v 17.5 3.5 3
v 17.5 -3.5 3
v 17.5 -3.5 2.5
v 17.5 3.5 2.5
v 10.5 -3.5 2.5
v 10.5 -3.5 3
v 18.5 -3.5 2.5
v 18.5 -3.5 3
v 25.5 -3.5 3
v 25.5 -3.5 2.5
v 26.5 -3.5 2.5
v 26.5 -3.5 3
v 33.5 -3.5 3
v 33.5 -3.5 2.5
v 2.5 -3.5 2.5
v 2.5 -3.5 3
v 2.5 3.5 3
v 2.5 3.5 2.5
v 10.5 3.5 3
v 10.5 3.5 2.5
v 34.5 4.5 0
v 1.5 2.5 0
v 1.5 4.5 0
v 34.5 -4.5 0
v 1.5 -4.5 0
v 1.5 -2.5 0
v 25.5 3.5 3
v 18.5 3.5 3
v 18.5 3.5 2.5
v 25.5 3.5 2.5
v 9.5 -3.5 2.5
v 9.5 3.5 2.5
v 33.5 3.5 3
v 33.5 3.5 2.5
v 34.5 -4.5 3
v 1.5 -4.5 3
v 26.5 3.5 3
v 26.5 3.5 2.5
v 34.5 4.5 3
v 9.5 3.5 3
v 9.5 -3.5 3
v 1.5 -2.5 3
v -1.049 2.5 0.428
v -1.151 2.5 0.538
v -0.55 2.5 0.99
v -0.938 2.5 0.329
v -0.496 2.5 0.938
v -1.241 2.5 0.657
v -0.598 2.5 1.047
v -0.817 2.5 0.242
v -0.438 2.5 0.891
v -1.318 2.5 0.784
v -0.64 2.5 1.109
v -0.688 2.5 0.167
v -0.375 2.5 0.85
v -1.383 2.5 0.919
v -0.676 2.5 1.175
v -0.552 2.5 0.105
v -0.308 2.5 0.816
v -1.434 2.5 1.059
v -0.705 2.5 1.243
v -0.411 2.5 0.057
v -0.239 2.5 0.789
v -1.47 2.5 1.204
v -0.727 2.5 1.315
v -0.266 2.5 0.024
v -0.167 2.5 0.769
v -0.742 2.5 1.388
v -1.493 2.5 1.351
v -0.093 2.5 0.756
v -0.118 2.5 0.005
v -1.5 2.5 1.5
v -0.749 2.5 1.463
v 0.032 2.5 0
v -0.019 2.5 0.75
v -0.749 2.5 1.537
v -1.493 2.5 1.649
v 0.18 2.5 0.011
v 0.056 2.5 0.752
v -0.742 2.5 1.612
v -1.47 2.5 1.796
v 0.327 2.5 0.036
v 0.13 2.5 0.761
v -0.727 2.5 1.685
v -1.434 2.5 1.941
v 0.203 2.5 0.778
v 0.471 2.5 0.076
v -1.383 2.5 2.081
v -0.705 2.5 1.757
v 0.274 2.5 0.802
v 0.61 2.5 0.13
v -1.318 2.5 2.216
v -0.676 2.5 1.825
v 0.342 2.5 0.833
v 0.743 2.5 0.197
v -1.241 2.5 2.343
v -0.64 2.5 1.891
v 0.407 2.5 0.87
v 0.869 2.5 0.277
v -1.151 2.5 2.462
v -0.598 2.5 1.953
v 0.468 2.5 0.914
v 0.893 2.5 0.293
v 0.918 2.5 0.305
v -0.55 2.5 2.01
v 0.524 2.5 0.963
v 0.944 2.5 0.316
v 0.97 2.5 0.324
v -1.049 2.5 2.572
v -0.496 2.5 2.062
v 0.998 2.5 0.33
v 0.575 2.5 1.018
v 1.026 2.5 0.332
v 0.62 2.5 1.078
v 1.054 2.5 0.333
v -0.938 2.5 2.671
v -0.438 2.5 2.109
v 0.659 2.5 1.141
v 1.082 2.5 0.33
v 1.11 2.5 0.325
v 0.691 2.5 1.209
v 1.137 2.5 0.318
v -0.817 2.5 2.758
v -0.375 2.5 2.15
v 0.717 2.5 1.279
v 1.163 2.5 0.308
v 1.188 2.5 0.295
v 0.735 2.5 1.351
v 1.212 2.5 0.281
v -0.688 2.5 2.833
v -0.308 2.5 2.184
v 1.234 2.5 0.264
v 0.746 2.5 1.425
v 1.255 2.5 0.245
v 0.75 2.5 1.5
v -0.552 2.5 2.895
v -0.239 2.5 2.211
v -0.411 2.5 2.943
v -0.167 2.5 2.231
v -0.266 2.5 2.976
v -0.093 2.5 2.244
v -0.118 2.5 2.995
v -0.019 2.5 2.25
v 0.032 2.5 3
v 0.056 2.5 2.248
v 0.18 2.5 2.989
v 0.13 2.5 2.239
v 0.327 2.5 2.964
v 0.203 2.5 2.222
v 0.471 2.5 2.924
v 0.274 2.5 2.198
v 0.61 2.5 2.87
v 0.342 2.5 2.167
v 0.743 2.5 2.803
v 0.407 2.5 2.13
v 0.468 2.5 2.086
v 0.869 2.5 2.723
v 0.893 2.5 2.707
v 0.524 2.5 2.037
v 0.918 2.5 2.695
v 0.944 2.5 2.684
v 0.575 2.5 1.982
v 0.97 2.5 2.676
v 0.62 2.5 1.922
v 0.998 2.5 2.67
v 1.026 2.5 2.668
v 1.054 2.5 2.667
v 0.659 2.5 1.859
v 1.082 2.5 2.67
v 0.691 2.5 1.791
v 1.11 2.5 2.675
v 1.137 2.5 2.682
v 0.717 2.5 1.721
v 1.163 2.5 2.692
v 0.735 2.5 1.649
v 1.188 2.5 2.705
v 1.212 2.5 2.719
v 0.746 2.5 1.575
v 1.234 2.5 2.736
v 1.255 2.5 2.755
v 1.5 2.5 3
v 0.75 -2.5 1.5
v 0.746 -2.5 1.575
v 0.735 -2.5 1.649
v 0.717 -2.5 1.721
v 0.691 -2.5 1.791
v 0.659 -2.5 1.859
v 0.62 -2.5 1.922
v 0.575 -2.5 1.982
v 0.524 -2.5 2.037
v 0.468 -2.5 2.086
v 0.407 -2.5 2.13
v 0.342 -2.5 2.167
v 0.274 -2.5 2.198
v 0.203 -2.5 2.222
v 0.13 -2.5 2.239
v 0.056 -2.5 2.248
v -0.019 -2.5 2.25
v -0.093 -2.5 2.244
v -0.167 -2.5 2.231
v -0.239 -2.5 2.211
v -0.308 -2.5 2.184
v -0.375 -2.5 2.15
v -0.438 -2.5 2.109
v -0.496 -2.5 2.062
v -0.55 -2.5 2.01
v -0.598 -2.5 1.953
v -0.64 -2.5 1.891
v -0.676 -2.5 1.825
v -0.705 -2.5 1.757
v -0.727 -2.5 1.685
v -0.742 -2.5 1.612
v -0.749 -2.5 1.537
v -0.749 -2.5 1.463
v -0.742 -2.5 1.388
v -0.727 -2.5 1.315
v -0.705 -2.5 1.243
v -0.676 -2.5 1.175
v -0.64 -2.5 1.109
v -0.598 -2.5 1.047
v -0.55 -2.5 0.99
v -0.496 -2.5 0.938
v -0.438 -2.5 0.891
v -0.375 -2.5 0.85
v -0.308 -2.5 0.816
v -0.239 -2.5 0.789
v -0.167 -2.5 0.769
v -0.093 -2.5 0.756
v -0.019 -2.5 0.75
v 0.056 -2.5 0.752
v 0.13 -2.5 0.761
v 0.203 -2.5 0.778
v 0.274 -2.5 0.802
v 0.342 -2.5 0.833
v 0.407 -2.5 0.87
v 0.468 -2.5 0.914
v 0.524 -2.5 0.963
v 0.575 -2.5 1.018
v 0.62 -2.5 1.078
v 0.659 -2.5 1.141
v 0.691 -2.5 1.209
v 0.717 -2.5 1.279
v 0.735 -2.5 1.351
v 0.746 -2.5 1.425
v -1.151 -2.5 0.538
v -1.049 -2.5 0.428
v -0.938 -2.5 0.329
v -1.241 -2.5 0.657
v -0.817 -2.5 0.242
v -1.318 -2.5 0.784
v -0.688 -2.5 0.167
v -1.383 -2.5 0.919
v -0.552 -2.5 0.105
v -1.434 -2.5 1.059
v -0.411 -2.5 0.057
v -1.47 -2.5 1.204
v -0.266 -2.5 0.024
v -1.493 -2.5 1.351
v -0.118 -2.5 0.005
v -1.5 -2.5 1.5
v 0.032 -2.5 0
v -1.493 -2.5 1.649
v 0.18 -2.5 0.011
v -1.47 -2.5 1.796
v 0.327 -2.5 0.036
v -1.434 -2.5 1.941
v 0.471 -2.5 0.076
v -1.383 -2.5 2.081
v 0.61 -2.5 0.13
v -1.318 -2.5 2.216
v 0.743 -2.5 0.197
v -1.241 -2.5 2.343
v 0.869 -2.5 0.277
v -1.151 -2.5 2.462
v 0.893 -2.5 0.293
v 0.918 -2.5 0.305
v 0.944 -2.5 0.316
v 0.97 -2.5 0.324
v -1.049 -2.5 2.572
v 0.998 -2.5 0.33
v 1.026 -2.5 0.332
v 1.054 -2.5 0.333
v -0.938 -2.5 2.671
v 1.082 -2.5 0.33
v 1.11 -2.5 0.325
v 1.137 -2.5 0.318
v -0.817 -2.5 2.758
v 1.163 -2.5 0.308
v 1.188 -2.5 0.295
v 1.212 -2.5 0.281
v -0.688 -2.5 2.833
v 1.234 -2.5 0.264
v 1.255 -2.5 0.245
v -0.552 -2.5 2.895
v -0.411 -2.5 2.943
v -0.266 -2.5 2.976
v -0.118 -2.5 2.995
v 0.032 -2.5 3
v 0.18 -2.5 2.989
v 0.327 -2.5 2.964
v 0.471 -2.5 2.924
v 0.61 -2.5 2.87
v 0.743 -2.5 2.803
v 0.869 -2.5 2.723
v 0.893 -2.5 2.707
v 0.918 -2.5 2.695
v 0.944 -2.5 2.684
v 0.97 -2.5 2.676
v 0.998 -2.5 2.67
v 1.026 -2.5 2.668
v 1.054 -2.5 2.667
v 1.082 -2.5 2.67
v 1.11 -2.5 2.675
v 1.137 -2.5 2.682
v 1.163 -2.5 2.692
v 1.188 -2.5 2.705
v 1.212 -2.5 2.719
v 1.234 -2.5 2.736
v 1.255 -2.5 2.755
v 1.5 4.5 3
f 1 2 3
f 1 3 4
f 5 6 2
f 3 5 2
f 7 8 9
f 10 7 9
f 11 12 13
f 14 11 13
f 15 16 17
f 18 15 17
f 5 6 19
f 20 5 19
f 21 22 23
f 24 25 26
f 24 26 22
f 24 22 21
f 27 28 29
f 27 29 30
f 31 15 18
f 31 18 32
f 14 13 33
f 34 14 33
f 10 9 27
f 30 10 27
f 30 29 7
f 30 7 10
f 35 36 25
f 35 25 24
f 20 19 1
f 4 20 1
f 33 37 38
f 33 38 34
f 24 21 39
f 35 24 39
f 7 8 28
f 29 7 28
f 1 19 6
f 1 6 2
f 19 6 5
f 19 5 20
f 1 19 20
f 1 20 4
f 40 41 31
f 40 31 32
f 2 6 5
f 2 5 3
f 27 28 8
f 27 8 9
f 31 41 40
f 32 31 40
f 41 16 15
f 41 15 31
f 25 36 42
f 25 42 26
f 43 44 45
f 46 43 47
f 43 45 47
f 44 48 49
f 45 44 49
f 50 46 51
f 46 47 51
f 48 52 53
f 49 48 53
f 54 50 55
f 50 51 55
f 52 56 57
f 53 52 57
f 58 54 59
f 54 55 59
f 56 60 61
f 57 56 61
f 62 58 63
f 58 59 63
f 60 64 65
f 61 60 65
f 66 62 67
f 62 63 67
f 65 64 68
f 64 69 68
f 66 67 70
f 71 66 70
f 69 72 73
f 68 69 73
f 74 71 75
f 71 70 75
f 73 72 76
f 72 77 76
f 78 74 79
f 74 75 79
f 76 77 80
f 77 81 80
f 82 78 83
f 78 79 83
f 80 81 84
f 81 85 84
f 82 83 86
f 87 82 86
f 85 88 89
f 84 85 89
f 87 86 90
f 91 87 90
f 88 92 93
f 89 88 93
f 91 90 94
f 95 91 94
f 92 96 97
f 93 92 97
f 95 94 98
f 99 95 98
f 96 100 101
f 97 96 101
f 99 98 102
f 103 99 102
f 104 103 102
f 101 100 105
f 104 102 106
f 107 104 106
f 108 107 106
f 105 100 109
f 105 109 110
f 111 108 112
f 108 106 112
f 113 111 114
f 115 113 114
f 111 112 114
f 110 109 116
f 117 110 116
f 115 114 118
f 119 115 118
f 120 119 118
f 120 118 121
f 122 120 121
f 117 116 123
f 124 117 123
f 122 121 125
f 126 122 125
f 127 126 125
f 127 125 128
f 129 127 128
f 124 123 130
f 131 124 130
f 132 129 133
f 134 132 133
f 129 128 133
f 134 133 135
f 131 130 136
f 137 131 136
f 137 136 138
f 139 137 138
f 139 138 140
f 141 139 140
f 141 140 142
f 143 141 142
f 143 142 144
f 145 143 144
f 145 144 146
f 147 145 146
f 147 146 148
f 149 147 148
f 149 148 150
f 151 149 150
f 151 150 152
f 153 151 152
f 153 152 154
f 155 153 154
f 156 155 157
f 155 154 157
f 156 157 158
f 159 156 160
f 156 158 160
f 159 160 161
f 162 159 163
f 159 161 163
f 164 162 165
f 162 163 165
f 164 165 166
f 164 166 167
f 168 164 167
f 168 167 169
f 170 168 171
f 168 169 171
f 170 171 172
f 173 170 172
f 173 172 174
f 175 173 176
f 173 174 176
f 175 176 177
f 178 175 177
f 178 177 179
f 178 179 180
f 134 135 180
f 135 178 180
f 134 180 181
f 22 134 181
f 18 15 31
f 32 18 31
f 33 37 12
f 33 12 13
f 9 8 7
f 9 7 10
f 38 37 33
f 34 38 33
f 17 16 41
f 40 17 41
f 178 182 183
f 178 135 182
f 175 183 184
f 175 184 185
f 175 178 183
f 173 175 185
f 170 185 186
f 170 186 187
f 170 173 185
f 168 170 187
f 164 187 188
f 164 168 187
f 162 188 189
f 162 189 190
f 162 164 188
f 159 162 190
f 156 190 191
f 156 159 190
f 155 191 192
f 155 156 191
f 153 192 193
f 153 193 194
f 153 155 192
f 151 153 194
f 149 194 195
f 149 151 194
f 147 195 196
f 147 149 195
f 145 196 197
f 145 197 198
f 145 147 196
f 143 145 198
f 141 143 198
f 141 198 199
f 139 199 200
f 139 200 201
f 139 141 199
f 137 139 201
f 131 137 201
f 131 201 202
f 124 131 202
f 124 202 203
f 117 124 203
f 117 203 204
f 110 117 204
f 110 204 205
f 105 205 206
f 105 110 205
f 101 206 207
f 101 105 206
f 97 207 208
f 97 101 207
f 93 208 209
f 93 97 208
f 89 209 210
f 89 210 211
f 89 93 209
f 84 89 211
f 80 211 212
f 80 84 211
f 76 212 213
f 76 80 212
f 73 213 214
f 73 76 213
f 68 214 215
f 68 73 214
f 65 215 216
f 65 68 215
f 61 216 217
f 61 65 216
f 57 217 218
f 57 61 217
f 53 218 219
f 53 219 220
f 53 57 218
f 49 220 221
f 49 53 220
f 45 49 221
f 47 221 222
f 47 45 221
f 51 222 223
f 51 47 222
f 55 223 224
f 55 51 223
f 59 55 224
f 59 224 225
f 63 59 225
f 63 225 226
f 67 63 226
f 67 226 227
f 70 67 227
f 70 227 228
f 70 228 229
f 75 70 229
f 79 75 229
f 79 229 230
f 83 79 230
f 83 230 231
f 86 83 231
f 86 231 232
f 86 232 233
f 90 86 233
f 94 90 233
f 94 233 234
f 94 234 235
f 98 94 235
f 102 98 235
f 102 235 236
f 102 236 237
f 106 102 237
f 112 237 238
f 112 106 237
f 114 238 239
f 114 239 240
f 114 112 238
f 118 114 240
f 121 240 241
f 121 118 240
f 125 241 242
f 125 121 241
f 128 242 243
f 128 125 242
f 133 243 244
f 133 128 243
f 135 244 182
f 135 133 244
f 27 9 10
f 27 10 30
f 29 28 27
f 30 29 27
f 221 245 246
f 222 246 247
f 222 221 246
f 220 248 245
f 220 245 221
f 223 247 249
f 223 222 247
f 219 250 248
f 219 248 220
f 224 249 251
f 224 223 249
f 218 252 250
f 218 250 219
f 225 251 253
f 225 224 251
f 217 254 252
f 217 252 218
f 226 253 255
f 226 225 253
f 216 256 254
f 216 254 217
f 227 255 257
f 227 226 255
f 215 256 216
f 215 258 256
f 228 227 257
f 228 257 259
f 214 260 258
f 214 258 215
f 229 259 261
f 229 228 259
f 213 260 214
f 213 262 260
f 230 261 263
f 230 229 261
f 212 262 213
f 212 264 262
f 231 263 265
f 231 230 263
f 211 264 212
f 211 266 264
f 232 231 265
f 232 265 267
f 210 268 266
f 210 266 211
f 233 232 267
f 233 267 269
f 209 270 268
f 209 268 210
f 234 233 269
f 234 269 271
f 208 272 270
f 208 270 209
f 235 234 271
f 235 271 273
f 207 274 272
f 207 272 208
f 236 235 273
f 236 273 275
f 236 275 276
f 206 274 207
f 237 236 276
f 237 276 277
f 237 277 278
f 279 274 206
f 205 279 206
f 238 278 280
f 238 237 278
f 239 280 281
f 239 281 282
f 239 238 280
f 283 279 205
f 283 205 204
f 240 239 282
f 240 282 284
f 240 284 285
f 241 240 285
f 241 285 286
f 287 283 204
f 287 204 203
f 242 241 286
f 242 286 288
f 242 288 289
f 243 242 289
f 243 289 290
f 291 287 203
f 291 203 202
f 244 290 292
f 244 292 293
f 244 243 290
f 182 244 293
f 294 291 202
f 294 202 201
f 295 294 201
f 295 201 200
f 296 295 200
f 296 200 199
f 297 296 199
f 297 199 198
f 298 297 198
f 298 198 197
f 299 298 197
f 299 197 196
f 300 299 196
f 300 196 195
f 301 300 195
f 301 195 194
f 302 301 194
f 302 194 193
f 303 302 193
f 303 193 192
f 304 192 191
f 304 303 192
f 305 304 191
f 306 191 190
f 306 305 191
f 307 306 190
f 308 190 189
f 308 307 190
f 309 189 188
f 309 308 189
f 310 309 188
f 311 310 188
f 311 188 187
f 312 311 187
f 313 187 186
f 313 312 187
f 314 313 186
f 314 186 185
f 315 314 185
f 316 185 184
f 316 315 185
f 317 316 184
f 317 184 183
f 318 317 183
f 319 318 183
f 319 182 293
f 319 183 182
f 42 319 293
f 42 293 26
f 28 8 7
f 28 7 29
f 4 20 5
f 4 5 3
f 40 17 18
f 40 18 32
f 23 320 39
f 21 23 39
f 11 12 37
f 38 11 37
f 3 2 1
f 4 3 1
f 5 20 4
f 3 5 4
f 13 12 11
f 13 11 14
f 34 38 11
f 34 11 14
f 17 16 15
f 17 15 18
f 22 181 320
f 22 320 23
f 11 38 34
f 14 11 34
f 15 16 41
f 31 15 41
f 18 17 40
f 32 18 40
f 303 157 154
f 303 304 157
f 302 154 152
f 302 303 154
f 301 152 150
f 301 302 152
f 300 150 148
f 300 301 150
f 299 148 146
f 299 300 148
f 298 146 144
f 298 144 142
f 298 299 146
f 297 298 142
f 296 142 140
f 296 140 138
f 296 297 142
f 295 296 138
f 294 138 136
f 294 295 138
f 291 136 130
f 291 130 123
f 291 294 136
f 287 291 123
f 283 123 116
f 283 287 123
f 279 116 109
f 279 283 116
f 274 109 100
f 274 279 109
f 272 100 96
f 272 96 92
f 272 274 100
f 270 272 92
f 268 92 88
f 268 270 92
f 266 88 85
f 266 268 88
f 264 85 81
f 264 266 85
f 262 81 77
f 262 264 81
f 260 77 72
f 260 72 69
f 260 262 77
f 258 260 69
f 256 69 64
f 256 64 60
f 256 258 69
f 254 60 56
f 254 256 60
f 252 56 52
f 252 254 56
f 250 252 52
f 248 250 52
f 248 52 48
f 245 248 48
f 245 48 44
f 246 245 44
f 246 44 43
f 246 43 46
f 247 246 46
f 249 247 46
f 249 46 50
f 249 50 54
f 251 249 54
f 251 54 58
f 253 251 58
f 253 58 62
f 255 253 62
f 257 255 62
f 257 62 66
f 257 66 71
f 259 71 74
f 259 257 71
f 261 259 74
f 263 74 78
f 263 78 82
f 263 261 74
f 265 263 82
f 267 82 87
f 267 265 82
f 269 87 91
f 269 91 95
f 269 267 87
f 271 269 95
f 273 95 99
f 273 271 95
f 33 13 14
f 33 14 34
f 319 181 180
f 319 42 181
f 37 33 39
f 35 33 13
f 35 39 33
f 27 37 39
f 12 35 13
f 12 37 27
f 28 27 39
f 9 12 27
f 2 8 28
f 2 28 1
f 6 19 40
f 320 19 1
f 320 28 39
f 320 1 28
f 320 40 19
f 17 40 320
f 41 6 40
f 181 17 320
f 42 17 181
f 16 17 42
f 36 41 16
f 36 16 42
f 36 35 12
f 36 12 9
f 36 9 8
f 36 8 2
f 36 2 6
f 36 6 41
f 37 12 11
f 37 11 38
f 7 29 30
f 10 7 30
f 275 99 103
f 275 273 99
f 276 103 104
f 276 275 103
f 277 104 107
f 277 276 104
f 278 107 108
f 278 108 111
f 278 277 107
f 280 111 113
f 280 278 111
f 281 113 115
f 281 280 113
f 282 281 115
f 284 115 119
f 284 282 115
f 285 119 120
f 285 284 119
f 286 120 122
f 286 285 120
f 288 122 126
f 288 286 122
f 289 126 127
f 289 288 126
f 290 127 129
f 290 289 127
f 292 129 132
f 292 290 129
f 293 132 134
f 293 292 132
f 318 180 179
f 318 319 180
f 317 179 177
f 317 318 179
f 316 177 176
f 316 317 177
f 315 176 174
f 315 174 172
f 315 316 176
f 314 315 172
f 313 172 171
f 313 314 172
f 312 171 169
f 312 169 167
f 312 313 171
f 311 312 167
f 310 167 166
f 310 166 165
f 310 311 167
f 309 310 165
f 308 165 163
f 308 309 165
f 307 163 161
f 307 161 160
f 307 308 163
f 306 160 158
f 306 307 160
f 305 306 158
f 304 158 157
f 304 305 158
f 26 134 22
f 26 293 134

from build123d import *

# Parameters (mm, degrees)
F1_DEPTH = 4.5
F0_R     = 0.75
F2_DEPTH = 2.5
F3_W     = 7
F3_H     = 7
F4_DEPTH = 0.5
F5_DEPTH = 0.5
F6_R     = 0.3


with BuildPart() as f1:
    # F0 (on Front) → F1 (new body, symmetric)
    with BuildSketch(Plane.XZ):
        Polygon((34.5, 3), (1.5, 3), (1.5, 1.5), (1.5, 0), (34.5, 0), align=None)
    extrude(amount=F1_DEPTH, both=True)

    # F0 (on Front) → F2 (join, symmetric)
    with BuildSketch(Plane.XZ):
        with BuildLine():
            Line((1.5, 1.5), (1.5, 3))
            Line((1.5, 3), (1.0606601718, 2.5606601718))
            ThreePointArc((1.0606601718, 2.5606601718), (1.3858192988, 2.0740251485), (1.5, 1.5))
        make_face()
        with BuildLine():
            Line((1.5, 0), (1.5, 1.5))
            ThreePointArc((1.5, 1.5), (1.3858192988, 0.9259748515), (1.0606601718, 0.4393398282))
            Line((1.0606601718, 0.4393398282), (1.5, 0))
        make_face()
        with BuildLine():
            ThreePointArc((1.0606601718, 0.4393398282), (1.3858192988, 0.9259748515), (1.5, 1.5))
            ThreePointArc((1.5, 1.5), (1.3858192988, 2.0740251485), (1.0606601718, 2.5606601718))
            ThreePointArc((1.0606601718, 2.5606601718), (-1.5, 1.5), (1.0606601718, 0.4393398282))
        make_face()
        with Locations((0, 1.5)):
            Circle(F0_R, mode=Mode.SUBTRACT)
    extrude(amount=F2_DEPTH, both=True)

    # F3 (on face) → F4 (cut)
    with BuildSketch(Plane.XY.offset(3)):
        with Locations((30, 0)):
            Rectangle(F3_W, F3_H)
        with Locations((22, 0)):
            Rectangle(F3_W, F3_H)
        with Locations((14, 0)):
            Rectangle(F3_W, F3_H)
        with Locations((6, 0)):
            Rectangle(F3_W, F3_H)
    extrude(amount=-F4_DEPTH, mode=Mode.SUBTRACT)

    # F6
    f6_edges = [f1.edges().sort_by_distance(p)[0] for p in [
        (1.06066, 0, 2.56066),
        (1.06066, 0, 0.43934),
    ]]
    fillet(f6_edges, radius=F6_R)


with BuildPart() as f5:
    # F3 (on face) → F5 (new body)
    with BuildSketch(Plane.XY.offset(3)):
        with Locations((6, 0)):
            Rectangle(F3_W, F3_H)
    extrude(amount=-F5_DEPTH)


with BuildPart() as f5b:
    # F3 (on face) → F5, piece 2 (new body)
    with BuildSketch(Plane.XY.offset(3)):
        with Locations((14, 0)):
            Rectangle(F3_W, F3_H)
    extrude(amount=-F5_DEPTH)


with BuildPart() as f5c:
    # F3 (on face) → F5, piece 3 (new body)
    with BuildSketch(Plane.XY.offset(3)):
        with Locations((22, 0)):
            Rectangle(F3_W, F3_H)
    extrude(amount=-F5_DEPTH)


with BuildPart() as f5d:
    # F3 (on face) → F5, piece 4 (new body)
    with BuildSketch(Plane.XY.offset(3)):
        with Locations((30, 0)):
            Rectangle(F3_W, F3_H)
    extrude(amount=-F5_DEPTH)


solid = Compound([f1.part, f5.part, f5b.part, f5c.part, f5d.part])
